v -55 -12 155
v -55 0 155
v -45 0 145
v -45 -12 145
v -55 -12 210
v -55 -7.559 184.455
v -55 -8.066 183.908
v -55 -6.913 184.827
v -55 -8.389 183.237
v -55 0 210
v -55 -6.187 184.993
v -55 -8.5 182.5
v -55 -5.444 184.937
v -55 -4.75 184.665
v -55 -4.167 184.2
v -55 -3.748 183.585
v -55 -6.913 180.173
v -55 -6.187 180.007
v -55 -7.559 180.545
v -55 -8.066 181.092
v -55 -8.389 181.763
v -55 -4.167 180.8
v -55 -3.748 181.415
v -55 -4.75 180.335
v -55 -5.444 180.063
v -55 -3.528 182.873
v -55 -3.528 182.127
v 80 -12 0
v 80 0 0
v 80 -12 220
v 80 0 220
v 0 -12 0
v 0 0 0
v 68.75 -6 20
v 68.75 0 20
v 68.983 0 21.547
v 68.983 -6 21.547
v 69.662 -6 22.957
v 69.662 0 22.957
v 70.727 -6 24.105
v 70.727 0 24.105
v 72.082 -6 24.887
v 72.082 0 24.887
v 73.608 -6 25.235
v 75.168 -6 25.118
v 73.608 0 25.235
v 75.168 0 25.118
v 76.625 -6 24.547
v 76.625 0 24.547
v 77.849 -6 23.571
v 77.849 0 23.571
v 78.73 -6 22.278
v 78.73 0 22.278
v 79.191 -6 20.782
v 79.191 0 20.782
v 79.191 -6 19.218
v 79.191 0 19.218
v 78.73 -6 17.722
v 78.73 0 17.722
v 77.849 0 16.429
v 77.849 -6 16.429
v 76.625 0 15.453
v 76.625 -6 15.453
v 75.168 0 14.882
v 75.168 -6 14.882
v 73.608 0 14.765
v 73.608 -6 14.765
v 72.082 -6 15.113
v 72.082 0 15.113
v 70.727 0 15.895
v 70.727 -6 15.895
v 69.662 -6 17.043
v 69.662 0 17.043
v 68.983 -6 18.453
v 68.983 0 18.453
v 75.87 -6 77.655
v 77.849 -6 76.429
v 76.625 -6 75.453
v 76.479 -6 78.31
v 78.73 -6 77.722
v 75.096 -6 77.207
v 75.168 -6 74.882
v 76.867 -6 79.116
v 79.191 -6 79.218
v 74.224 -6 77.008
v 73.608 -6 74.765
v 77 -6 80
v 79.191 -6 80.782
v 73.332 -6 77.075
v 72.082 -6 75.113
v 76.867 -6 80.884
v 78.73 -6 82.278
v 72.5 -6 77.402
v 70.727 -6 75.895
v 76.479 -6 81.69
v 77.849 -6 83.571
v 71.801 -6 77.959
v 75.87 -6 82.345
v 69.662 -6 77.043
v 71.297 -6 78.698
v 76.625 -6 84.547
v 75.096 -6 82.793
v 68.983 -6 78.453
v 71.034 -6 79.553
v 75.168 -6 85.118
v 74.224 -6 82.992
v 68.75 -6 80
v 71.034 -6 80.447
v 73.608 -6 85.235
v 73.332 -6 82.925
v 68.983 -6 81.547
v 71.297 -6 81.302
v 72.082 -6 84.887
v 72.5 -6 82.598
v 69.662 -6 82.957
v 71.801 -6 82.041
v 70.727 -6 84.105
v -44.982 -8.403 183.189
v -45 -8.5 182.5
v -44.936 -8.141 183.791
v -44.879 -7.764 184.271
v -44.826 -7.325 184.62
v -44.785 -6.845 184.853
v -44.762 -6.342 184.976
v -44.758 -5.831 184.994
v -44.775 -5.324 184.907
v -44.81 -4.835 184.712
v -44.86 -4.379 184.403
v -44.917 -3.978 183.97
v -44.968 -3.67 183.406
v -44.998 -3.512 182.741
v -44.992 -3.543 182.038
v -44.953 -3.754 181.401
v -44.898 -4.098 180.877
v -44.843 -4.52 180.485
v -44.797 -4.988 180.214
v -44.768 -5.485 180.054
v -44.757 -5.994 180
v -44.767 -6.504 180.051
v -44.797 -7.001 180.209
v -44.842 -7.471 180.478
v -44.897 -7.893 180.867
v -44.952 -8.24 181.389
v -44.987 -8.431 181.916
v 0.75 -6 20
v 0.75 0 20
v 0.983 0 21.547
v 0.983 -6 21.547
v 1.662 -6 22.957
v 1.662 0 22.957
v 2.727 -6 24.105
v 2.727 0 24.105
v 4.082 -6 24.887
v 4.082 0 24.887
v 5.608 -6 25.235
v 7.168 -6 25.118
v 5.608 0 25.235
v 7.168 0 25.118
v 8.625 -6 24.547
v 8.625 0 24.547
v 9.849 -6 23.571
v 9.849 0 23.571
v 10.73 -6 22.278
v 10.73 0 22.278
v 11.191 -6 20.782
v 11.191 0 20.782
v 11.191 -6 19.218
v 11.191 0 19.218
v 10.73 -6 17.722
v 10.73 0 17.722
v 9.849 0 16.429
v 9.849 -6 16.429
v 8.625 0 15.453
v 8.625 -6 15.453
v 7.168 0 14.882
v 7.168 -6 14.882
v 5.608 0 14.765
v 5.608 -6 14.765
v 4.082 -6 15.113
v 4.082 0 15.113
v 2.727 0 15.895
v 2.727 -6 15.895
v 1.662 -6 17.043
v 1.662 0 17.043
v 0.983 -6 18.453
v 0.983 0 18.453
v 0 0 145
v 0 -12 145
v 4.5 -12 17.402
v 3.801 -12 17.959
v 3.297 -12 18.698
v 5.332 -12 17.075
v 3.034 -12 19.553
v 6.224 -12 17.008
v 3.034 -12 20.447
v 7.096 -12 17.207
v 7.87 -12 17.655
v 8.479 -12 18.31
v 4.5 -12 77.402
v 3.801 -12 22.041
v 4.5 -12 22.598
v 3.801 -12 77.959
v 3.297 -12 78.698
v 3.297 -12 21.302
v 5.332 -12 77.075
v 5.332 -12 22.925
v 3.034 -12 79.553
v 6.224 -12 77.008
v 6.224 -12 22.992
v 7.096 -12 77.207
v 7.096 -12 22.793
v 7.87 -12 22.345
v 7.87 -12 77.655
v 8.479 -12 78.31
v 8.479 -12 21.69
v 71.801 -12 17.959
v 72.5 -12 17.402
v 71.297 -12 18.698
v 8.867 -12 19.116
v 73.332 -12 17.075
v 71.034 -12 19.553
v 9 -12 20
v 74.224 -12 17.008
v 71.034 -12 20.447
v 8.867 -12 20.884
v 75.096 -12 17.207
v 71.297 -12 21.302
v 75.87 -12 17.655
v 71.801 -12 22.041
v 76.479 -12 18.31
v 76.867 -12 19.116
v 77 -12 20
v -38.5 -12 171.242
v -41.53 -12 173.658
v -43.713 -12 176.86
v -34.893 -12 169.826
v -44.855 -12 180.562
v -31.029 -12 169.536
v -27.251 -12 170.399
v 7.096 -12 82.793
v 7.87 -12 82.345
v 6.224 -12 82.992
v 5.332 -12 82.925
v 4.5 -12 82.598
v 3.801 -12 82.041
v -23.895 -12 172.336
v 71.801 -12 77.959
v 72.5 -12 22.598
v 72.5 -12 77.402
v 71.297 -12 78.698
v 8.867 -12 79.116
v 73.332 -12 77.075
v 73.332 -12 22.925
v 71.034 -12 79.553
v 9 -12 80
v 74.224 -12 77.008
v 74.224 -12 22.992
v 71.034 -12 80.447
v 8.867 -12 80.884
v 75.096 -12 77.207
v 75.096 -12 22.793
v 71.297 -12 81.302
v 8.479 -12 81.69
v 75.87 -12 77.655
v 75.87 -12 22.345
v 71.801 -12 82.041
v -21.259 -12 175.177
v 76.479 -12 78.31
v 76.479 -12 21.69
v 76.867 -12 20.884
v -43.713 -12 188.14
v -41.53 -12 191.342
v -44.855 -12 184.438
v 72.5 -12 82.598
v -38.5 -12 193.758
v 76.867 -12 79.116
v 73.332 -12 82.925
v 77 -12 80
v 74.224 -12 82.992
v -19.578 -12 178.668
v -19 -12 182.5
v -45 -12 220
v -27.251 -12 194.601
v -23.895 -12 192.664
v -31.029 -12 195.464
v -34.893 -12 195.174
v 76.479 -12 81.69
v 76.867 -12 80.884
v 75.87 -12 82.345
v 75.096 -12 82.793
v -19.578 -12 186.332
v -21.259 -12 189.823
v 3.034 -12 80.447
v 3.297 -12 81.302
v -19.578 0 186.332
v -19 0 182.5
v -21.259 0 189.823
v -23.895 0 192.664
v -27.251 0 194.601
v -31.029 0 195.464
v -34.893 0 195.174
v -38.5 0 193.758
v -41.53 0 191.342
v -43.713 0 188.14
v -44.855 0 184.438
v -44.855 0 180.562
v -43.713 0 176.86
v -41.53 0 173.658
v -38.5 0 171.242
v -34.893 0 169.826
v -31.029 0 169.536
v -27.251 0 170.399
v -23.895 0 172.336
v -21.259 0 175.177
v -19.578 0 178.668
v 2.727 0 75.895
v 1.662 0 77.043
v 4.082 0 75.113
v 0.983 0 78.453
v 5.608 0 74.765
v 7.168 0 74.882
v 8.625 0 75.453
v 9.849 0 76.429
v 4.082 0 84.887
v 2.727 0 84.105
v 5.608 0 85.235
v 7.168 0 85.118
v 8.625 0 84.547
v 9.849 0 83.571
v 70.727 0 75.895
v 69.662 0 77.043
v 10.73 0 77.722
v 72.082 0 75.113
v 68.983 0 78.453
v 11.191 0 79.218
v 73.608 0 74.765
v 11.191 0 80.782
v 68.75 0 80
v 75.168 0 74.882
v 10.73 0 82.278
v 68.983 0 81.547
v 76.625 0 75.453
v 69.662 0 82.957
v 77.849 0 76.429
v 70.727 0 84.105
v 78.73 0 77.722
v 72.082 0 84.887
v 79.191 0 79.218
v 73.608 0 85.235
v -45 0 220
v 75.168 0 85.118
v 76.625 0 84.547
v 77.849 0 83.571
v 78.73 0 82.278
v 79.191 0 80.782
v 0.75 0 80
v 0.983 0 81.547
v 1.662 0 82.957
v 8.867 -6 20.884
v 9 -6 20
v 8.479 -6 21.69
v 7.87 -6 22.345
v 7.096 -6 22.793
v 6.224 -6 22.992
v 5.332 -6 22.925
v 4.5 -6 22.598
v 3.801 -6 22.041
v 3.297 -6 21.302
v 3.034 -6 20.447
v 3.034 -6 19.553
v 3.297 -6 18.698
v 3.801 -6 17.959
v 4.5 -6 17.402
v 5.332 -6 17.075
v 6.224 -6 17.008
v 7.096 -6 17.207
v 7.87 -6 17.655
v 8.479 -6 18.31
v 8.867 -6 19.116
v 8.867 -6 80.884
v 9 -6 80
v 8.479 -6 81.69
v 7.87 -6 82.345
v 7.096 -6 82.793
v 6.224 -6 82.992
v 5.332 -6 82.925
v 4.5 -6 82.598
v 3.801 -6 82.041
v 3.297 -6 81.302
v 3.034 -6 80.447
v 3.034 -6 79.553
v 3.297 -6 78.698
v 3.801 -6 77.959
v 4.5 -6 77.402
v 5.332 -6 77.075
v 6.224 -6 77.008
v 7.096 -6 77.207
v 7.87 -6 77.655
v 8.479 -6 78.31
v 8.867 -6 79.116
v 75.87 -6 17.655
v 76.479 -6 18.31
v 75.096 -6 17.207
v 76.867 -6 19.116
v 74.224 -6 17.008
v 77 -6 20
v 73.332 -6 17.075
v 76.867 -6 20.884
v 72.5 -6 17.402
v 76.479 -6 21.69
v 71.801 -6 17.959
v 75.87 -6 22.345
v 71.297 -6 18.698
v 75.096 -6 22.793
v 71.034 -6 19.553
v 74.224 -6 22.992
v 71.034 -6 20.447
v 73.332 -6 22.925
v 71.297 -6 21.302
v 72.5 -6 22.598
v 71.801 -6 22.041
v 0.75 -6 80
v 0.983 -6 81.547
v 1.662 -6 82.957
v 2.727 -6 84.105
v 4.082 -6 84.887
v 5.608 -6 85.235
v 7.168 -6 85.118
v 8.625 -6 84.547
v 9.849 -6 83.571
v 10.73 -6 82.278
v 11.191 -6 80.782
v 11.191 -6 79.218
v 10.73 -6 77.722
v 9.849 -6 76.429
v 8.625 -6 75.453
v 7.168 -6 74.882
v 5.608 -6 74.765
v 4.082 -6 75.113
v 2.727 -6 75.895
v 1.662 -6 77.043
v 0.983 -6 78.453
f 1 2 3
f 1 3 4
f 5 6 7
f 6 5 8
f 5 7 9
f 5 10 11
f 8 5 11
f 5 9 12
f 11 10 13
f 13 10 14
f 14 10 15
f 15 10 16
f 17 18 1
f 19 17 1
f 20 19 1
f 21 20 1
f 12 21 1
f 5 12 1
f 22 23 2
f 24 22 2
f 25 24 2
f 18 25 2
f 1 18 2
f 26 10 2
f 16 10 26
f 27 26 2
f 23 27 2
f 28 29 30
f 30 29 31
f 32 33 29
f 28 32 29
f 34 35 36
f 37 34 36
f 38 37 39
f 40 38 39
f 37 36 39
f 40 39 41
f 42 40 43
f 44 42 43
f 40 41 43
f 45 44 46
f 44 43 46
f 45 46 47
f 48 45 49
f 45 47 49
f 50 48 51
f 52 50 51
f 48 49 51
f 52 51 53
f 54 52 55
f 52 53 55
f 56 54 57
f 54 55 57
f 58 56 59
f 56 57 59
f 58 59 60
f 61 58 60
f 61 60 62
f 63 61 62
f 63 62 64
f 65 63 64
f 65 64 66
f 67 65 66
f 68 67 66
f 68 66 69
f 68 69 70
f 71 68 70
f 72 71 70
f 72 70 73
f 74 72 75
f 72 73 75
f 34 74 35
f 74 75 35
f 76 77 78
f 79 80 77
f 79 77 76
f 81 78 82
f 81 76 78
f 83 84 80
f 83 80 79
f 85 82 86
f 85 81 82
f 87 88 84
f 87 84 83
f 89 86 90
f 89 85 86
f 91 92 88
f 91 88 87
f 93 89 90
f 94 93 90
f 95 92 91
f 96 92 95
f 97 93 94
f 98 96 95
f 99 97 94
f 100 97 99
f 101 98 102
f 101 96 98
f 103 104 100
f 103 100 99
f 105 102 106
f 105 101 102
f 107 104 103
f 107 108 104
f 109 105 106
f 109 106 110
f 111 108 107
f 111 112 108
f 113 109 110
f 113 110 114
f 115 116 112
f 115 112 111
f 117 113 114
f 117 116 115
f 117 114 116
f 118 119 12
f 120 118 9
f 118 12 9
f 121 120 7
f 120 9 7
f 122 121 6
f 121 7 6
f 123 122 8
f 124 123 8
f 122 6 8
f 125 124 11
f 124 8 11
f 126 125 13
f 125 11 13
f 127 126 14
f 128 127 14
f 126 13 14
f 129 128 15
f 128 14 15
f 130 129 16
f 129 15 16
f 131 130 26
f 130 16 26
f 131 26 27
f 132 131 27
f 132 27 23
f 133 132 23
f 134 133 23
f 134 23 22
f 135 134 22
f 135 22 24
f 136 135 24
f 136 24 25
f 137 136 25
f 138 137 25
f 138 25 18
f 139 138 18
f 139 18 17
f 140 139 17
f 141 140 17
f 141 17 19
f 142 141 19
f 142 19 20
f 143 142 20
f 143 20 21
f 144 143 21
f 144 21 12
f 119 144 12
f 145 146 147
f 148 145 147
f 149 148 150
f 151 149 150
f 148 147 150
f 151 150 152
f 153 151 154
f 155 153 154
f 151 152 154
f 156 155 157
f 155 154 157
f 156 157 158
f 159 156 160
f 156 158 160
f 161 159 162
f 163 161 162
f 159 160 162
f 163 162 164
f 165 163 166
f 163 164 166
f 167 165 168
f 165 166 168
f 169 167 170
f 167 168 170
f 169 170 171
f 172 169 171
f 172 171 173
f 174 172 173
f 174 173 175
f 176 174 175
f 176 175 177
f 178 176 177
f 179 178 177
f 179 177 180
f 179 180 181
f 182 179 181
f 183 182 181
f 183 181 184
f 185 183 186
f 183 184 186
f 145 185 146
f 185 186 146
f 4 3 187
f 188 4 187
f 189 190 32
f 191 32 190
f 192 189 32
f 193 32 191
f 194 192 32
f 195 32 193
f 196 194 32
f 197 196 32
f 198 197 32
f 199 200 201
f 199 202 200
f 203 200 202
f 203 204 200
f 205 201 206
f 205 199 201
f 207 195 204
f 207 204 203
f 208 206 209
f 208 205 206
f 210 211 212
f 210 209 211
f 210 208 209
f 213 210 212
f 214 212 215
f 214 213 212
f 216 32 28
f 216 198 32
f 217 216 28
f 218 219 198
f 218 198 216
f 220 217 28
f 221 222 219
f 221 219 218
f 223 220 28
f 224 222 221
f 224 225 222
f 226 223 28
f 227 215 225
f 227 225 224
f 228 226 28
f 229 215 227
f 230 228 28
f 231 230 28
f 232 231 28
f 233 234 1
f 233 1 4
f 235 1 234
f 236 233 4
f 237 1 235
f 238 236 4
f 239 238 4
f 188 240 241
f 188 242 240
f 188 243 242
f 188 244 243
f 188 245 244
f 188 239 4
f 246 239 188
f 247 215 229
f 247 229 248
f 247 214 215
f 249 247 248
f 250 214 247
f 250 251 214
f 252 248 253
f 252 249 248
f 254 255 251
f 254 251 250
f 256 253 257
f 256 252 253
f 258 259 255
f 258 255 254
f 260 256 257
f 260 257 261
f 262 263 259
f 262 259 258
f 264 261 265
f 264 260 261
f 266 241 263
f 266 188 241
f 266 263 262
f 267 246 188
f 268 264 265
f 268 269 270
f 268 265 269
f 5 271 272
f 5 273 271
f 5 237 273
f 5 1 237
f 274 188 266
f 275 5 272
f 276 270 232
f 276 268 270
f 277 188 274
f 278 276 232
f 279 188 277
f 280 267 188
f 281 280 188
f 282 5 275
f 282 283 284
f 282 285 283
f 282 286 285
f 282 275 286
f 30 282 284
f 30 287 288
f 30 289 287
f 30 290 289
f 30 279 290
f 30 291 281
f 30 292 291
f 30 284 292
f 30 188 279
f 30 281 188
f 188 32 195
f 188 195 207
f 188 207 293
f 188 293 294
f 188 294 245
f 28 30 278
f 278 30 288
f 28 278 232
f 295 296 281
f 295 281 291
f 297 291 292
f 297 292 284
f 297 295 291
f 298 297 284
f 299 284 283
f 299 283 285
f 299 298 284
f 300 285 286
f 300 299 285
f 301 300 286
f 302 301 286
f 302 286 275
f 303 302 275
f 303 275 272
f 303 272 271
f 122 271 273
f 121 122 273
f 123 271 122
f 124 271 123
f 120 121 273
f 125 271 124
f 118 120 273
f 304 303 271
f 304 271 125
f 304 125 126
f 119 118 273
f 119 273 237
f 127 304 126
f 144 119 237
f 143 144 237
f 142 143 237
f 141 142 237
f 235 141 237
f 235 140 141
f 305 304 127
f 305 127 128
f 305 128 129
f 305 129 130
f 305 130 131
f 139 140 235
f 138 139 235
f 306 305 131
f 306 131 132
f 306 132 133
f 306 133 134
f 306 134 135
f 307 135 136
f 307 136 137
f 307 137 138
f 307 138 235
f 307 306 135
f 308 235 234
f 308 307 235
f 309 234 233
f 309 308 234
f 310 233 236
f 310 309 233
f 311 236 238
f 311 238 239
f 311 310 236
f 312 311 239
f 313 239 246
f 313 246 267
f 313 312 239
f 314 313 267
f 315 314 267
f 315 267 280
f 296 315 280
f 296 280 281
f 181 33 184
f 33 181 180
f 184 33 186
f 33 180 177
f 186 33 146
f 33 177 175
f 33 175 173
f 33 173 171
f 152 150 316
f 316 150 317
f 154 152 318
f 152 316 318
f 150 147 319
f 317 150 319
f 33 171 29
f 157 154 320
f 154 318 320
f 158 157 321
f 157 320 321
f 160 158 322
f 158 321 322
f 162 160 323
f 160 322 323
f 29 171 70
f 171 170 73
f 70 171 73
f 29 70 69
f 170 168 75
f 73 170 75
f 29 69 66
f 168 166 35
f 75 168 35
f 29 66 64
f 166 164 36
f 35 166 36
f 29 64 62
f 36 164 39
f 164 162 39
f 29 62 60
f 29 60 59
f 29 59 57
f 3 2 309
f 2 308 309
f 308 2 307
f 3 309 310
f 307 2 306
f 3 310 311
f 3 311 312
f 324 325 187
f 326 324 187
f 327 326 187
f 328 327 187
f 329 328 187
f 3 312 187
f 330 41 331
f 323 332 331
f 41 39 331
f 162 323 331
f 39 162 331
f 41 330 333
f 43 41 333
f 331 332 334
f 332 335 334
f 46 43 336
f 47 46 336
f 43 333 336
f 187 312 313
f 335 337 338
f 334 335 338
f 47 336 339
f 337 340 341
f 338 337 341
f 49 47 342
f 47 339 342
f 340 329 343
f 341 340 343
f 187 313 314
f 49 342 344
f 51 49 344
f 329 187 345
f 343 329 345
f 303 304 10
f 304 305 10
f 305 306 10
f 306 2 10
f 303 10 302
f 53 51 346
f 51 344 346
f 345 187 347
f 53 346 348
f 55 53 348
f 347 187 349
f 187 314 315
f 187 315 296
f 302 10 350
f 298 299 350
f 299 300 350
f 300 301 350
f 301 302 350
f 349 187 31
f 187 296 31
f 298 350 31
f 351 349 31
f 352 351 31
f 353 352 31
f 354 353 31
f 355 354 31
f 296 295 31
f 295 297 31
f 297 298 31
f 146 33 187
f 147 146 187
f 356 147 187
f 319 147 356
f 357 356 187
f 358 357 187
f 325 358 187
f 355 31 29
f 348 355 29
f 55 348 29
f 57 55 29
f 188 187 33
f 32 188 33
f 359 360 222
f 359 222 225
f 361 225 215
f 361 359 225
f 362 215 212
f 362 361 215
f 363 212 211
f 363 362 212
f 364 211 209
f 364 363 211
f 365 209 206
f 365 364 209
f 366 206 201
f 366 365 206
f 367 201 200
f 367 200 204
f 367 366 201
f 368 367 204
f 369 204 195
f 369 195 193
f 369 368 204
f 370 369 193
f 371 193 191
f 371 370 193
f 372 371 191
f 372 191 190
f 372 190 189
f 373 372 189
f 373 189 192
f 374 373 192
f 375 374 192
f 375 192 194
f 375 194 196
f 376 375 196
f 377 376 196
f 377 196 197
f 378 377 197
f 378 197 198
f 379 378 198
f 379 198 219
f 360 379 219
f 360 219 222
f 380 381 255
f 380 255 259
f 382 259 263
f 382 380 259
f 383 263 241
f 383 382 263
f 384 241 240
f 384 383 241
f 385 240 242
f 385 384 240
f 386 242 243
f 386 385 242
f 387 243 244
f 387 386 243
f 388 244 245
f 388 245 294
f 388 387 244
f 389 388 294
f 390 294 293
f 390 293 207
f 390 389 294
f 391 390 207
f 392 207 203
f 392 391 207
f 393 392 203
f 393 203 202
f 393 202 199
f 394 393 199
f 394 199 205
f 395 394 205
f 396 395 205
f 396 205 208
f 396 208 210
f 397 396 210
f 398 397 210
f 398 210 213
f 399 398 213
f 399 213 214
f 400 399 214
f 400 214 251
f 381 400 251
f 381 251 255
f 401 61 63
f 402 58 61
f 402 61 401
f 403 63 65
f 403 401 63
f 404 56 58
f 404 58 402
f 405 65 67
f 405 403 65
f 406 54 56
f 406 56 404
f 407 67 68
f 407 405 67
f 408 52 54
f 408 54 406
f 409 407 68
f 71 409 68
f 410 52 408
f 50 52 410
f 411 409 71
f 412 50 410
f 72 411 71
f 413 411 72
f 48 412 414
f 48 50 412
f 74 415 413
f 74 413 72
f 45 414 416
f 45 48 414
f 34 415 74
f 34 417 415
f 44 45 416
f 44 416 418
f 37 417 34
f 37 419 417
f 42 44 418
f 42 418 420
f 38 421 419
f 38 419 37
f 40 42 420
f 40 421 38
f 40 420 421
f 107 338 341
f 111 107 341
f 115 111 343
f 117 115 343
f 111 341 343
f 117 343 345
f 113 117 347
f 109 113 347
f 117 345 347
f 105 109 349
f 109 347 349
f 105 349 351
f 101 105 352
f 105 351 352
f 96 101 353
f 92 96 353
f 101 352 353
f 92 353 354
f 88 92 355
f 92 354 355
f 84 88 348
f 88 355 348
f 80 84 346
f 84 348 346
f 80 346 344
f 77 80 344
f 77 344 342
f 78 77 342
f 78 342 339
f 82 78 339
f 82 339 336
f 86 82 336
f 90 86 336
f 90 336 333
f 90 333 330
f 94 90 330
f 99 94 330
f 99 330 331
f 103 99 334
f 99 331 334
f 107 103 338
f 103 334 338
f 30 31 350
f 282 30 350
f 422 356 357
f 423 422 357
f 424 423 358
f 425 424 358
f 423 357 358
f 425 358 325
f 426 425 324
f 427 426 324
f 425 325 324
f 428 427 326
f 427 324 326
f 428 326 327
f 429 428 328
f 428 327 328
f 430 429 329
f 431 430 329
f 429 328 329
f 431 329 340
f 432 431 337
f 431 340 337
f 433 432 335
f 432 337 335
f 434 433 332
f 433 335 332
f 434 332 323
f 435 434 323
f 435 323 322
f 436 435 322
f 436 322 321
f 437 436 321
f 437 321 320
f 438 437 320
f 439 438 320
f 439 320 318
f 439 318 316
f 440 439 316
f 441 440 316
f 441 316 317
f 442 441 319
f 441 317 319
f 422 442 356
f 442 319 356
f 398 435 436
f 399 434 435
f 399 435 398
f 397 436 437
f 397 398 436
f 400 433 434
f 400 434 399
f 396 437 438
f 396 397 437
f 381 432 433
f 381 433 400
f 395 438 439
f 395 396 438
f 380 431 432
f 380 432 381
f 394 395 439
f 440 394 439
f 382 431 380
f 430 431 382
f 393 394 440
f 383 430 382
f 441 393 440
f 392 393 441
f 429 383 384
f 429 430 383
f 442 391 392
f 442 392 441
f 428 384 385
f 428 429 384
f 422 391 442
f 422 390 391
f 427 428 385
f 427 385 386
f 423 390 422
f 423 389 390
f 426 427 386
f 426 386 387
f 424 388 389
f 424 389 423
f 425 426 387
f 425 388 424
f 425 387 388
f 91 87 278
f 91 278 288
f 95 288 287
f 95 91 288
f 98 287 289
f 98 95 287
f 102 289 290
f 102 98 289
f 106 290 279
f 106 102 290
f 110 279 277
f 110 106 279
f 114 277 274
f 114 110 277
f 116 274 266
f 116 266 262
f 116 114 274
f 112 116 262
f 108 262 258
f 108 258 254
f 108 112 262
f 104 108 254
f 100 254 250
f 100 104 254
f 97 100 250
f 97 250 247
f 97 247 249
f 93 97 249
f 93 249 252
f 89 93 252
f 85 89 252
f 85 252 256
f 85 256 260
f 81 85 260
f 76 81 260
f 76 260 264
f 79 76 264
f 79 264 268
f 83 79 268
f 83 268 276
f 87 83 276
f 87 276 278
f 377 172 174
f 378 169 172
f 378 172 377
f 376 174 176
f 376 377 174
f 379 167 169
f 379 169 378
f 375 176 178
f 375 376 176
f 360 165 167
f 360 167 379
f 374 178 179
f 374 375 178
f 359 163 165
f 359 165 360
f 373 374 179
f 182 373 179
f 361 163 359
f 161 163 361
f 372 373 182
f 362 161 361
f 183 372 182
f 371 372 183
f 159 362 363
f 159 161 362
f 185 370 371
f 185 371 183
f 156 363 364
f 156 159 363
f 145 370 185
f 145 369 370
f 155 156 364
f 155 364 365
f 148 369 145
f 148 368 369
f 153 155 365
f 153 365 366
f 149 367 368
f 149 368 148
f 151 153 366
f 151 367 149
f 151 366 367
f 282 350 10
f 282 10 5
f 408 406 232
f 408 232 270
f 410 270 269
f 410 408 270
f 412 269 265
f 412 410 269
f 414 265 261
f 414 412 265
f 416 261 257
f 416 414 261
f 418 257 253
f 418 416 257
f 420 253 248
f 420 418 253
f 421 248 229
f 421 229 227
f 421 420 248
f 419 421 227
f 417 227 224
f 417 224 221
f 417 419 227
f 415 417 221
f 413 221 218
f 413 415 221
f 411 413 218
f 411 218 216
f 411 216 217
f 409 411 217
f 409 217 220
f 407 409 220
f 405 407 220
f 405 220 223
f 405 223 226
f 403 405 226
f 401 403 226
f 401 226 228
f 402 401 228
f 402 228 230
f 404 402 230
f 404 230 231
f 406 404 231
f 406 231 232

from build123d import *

# Parameters (mm, degrees)
F0_R     = 3
F0_R_2   = 13
F1_DEPTH = 12
F2_SIZE  = 10
F3_R     = 2.5
F4_DEPTH = 25
F5_R     = 5.25
F5_R_2   = 3
F6_DEPTH = 6


with BuildPart() as f1:
    # F0 (on Front) → F1 (new body)
    with BuildSketch(Plane.XZ):
        Polygon((0, 145), (0, 0), (80, 0), (80, 220), (-55, 220), (-55, 145), align=None)
        with Locations((6, 20)):
            Circle(F0_R, mode=Mode.SUBTRACT)
        with Locations((6, 80)):
            Circle(F0_R, mode=Mode.SUBTRACT)
        with Locations((74, 20)):
            Circle(F0_R, mode=Mode.SUBTRACT)
        with Locations((74, 80)):
            Circle(F0_R, mode=Mode.SUBTRACT)
        with Locations((-32, 182.5)):
            Circle(F0_R_2, mode=Mode.SUBTRACT)
    extrude(amount=F1_DEPTH)

    # F2
    f2_edges = [f1.edges().sort_by_distance(p)[0] for p in [
        (-55, -6, 220),
        (-55, -6, 145),
    ]]
    chamfer(f2_edges, length=F2_SIZE)

    # F3 (on face) → F4 (cut)
    with BuildSketch(Plane(origin=(-55, 0, 0), x_dir=(0, -1, 0), z_dir=(-1, 0, 0))):
        with Locations((6, 182.5)):
            Circle(F3_R)
    extrude(amount=-F4_DEPTH, mode=Mode.SUBTRACT)

    # F5 (on face) → F6 (cut)
    with BuildSketch(Plane(origin=(0, 0, 0), x_dir=(-1, 0, 0), z_dir=(0, 1, 0))):
        with Locations((-74, 80)):
            Circle(F5_R)
        with Locations((-74, 80)):
            Circle(F5_R_2, mode=Mode.SUBTRACT)
        with Locations((-6, 80)):
            Circle(F5_R)
        with Locations((-6, 80)):
            Circle(F5_R_2, mode=Mode.SUBTRACT)
        with Locations((-6, 20)):
            Circle(F5_R)
        with Locations((-6, 20)):
            Circle(F5_R_2, mode=Mode.SUBTRACT)
        with Locations((-74, 20)):
            Circle(F5_R)
        with Locations((-74, 20)):
            Circle(F5_R_2, mode=Mode.SUBTRACT)
    extrude(amount=-F6_DEPTH, mode=Mode.SUBTRACT)


solid = f1.part
